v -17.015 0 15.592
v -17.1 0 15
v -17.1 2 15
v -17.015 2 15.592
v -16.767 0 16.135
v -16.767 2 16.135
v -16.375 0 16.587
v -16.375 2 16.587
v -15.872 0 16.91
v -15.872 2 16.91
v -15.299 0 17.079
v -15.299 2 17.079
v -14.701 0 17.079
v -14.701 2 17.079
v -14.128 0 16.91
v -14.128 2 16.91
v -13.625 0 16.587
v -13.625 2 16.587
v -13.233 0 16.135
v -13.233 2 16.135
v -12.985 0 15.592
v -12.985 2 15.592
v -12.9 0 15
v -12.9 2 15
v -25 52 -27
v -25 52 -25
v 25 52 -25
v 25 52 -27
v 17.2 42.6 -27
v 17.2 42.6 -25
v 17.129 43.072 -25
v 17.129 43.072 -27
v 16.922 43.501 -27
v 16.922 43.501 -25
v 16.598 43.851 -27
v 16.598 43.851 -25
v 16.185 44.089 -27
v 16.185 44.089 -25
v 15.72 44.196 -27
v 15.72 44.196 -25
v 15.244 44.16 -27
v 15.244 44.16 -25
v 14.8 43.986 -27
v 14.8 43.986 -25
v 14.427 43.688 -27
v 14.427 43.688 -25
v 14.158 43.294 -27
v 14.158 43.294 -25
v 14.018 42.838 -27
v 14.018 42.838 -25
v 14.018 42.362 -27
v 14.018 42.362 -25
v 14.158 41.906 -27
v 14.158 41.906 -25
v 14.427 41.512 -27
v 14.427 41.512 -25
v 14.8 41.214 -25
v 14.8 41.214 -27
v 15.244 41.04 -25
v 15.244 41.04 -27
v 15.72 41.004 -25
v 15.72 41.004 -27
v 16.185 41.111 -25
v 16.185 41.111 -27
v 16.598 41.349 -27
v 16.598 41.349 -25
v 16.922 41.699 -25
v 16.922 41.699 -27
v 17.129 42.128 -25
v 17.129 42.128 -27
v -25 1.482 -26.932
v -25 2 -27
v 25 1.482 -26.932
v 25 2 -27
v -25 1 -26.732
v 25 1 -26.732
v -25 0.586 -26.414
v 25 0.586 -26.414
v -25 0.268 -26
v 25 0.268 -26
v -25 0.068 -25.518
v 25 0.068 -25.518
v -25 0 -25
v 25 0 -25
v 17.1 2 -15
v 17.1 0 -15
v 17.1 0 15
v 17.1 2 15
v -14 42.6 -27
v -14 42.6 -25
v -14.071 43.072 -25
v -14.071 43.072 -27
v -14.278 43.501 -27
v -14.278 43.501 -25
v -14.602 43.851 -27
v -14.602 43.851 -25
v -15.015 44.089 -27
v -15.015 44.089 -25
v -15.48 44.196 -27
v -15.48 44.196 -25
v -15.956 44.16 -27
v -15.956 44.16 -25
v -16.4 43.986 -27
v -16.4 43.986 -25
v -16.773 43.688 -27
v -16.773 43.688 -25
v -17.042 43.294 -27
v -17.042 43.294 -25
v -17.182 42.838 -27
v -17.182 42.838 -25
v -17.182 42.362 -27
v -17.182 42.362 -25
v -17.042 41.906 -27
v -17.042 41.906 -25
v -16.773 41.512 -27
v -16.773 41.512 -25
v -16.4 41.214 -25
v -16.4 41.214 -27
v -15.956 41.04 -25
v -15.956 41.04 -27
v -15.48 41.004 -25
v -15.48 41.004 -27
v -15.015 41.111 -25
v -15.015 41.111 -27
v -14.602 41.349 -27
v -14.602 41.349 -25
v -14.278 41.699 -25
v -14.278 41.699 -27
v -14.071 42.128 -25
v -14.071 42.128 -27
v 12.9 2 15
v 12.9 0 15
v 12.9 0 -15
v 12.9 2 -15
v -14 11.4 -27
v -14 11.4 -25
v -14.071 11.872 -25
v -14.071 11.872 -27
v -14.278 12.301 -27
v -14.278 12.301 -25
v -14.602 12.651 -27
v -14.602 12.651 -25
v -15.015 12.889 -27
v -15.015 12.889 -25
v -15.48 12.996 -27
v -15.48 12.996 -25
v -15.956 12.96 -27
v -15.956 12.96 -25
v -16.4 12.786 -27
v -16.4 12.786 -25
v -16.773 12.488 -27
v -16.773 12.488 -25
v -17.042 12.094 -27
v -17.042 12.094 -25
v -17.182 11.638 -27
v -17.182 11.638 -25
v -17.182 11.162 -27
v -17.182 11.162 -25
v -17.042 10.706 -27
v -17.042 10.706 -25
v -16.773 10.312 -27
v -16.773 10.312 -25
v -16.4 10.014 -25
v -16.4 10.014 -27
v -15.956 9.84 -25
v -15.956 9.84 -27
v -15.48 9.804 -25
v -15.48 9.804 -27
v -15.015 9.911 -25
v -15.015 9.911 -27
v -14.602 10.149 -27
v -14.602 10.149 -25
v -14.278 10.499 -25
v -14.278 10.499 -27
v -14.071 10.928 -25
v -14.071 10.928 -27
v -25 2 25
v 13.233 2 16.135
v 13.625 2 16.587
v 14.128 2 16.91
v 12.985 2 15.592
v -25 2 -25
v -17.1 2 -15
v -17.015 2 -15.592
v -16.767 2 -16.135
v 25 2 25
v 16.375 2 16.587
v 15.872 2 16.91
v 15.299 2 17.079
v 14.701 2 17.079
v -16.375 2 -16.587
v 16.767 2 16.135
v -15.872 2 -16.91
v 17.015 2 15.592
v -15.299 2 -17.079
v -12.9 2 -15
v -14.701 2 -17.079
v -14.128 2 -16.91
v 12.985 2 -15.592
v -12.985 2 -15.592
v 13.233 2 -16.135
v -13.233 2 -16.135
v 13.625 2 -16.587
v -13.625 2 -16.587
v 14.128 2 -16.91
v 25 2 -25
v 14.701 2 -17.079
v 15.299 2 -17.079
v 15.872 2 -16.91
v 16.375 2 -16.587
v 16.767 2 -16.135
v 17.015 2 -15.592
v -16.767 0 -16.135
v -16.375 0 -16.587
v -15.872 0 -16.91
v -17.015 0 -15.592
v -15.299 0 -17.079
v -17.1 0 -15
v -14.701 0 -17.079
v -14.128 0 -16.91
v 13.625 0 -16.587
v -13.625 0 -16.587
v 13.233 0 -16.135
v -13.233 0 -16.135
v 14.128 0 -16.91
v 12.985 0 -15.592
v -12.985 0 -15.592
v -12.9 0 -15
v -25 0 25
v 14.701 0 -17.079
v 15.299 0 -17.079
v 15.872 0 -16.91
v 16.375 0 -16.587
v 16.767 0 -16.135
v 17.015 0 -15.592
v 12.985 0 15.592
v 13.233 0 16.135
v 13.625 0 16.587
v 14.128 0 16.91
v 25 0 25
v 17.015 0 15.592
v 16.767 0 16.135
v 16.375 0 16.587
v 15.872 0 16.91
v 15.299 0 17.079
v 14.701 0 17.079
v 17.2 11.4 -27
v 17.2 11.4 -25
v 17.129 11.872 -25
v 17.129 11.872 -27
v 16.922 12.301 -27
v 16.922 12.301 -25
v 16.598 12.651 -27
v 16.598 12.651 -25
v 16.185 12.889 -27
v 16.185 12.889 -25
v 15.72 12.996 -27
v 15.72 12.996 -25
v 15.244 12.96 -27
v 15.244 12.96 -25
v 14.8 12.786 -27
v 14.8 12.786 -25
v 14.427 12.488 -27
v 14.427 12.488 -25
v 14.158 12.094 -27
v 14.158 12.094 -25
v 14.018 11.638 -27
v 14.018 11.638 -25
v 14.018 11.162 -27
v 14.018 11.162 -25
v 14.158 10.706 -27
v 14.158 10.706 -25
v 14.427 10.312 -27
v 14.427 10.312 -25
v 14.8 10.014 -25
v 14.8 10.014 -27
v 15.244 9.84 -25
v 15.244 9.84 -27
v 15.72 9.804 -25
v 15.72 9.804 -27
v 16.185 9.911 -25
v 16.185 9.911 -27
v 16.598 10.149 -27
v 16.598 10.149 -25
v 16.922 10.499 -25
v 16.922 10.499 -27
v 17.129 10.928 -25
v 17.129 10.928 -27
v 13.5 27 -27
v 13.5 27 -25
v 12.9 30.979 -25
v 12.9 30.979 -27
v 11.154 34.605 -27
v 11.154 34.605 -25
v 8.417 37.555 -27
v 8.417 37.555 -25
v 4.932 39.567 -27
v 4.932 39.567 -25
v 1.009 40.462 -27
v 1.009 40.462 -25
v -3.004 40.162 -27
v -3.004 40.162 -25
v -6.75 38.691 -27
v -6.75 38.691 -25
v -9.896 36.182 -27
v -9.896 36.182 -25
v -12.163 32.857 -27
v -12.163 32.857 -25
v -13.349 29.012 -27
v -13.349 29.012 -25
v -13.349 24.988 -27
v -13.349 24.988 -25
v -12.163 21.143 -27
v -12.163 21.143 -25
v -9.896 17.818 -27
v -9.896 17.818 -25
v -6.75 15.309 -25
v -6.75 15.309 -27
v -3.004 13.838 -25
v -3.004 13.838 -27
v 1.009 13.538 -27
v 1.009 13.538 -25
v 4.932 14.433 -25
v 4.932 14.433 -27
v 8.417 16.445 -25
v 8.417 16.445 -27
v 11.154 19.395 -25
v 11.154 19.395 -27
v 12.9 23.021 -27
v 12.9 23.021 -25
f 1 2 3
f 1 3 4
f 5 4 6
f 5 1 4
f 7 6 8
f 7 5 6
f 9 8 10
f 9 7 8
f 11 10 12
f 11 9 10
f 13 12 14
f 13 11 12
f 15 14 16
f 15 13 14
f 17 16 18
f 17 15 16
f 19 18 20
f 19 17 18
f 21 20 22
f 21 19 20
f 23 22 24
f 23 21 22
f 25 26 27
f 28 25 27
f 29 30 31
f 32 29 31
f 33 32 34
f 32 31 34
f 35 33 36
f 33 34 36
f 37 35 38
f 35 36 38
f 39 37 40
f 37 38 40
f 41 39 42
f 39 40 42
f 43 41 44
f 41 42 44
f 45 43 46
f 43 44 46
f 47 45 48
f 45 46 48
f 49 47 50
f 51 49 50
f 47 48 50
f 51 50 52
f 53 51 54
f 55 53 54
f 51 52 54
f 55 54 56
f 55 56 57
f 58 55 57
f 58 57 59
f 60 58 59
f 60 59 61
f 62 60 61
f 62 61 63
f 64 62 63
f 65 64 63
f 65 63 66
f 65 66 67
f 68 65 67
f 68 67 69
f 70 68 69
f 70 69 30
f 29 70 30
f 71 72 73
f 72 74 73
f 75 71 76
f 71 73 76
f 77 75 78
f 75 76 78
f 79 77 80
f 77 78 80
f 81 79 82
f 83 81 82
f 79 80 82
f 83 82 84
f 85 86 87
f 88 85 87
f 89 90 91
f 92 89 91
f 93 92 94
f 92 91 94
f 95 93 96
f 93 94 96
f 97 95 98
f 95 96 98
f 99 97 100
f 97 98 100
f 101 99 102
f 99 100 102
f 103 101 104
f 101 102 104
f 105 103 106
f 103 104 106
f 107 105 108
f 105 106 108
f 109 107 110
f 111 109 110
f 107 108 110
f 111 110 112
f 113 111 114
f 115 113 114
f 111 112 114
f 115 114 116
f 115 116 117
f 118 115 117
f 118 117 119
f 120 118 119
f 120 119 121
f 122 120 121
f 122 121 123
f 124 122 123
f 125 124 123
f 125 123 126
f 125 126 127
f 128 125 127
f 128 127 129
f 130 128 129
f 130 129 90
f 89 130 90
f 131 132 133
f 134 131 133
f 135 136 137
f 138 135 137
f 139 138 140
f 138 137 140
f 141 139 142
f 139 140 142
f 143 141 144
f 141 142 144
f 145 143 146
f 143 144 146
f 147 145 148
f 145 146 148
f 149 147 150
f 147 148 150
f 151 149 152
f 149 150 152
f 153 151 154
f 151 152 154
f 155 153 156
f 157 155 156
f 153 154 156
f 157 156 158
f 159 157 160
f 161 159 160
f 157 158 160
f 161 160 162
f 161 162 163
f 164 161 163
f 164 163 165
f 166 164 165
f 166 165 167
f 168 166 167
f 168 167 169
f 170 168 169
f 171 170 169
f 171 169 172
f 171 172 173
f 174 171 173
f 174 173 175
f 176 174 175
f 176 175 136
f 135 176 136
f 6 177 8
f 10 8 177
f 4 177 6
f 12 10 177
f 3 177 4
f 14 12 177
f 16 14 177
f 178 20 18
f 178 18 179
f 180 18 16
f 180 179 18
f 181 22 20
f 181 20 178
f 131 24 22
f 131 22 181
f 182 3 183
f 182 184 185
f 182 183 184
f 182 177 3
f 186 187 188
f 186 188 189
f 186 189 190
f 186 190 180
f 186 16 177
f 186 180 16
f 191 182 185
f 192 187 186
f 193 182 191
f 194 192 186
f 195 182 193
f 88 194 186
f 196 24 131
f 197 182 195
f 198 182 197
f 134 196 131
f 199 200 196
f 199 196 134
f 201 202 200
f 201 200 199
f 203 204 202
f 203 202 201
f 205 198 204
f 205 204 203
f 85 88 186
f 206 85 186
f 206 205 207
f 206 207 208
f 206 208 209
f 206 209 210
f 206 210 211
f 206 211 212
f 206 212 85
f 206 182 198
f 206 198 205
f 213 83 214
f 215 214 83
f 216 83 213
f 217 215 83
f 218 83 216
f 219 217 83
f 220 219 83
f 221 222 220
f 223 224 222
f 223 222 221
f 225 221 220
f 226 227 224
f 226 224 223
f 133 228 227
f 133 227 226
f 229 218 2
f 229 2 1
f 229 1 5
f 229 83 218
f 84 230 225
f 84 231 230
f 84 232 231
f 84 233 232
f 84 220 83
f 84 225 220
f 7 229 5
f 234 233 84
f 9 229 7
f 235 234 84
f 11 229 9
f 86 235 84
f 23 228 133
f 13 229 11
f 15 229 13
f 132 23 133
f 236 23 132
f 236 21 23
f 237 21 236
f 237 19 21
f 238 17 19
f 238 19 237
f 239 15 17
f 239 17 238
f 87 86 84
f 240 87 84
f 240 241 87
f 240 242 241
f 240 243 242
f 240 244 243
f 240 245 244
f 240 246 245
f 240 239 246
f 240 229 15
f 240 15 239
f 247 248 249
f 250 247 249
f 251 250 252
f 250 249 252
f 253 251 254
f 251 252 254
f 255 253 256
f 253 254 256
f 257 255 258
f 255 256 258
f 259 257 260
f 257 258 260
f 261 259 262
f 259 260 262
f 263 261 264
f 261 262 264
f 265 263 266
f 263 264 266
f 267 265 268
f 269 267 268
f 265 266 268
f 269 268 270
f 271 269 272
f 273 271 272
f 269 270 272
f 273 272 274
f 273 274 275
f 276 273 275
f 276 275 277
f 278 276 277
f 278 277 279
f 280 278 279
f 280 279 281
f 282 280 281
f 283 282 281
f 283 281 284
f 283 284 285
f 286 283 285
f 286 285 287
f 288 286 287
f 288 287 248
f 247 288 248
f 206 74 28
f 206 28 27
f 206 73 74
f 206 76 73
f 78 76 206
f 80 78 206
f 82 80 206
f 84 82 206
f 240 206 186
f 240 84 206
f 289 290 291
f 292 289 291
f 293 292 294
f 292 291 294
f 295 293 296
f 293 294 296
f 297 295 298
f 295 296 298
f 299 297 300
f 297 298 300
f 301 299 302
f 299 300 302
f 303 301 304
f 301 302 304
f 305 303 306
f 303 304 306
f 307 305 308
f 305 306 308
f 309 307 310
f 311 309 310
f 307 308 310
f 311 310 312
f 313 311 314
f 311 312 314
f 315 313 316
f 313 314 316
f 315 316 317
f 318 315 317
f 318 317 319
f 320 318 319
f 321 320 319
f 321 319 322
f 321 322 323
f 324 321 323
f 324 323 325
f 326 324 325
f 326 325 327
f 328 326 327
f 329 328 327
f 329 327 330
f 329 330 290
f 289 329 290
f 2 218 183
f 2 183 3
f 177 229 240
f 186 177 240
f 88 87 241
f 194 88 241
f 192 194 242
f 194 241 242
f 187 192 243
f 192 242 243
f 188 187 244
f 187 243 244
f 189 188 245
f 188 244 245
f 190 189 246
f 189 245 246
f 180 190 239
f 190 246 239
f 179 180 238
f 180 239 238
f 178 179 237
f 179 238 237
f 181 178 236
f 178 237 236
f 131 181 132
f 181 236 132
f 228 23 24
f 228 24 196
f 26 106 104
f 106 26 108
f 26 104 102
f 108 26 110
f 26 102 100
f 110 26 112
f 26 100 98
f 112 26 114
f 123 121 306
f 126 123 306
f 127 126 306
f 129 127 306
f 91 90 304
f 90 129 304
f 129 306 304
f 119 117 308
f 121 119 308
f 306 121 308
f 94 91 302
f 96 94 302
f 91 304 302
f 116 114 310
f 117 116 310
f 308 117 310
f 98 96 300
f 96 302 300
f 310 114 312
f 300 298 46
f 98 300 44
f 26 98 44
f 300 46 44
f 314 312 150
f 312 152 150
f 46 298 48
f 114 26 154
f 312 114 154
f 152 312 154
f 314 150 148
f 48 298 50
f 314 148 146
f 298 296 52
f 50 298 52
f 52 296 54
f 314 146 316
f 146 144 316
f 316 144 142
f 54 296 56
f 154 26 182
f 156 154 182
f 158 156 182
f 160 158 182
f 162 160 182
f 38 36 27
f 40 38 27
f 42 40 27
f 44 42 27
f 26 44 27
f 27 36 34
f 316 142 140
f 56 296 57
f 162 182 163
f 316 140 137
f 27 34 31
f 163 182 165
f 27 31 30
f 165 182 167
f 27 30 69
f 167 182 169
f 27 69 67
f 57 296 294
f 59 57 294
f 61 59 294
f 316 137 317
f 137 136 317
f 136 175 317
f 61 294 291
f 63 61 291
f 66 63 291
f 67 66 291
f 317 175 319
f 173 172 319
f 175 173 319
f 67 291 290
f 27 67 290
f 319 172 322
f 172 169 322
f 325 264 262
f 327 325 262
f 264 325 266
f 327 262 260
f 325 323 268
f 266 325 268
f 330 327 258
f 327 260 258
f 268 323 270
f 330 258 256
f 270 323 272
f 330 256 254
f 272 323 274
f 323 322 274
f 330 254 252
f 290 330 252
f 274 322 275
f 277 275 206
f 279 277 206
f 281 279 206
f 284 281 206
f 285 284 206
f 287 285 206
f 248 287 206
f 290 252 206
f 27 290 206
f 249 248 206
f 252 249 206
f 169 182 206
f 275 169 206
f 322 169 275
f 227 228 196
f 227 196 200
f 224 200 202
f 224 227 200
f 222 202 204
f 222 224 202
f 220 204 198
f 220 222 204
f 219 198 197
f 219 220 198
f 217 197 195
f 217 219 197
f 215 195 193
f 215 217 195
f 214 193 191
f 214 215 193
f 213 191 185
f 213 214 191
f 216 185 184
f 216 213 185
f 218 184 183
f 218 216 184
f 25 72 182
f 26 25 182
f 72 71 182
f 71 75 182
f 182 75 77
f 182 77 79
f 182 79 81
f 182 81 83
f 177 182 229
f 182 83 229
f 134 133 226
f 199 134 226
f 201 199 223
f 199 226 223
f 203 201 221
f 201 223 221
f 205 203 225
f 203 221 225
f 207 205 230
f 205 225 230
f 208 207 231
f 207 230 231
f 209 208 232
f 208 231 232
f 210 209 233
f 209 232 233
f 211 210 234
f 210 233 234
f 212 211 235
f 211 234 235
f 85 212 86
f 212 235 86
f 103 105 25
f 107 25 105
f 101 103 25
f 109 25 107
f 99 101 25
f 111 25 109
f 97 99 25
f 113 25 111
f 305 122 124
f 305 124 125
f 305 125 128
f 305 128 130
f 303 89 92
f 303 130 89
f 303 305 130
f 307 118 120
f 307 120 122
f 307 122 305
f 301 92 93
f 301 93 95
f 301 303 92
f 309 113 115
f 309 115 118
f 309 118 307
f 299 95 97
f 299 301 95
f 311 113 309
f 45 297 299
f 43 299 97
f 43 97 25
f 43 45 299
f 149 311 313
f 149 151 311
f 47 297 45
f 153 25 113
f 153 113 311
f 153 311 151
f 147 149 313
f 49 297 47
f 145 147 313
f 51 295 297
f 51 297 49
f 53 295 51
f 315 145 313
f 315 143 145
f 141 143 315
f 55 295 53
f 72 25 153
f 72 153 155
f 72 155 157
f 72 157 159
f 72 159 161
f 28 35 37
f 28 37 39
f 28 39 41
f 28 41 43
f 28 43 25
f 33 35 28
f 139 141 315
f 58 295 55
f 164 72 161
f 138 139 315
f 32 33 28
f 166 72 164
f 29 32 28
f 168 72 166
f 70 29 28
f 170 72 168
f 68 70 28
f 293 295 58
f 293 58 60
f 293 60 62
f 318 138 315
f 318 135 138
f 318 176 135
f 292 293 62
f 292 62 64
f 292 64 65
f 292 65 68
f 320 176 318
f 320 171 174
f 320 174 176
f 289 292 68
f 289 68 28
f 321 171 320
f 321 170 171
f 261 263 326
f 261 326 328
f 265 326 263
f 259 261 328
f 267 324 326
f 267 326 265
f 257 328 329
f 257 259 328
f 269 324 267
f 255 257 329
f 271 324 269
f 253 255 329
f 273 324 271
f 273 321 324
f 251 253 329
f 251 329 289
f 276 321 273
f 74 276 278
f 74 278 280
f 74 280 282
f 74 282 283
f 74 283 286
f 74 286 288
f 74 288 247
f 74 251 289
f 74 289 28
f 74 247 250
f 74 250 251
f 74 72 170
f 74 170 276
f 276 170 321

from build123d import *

# Parameters (mm, degrees)
SKETCH1_W           = 50
SKETCH1_H           = 50
BOSS_EXTRUDE1_DEPTH = 2
SKETCH2_W           = 50
SKETCH2_H           = 2
BOSS_EXTRUDE2_DEPTH = 52
CUT_EXTRUDE1_REACH  = 4
SKETCH3_R           = 1.6
SKETCH3_R_2         = 13.5
FILLET1_R           = 2


with BuildPart() as part:
    # Sketch1 → Boss-Extrude1 (new body)
    with BuildSketch(Plane(origin=(0, 0, 0), x_dir=(1, 0, 0), z_dir=(0, 1, 0))):
        Rectangle(SKETCH1_W, SKETCH1_H)
        with BuildLine():
            Line((-17.1, 15), (-17.1, -15))
            ThreePointArc((-17.1, -15), (-15, -17.1), (-12.9, -15))
            Line((-12.9, -15), (-12.9, 15))
            ThreePointArc((-12.9, 15), (-15, 17.1), (-17.1, 15))
        make_face(mode=Mode.SUBTRACT)
        with BuildLine():
            Line((17.1, 15), (17.1, -15))
            ThreePointArc((17.1, -15), (15, -17.1), (12.9, -15))
            Line((12.9, -15), (12.9, 15))
            ThreePointArc((12.9, 15), (15, 17.1), (17.1, 15))
        make_face(mode=Mode.SUBTRACT)
    extrude(amount=BOSS_EXTRUDE1_DEPTH)

    # Sketch2 → Boss-Extrude2 (add)
    with BuildSketch(Plane.XZ):
        with Locations((0, -26)):
            Rectangle(SKETCH2_W, SKETCH2_H)
    extrude(amount=-BOSS_EXTRUDE2_DEPTH)

    # Sketch3 → Cut-Extrude1 (cut, up to next)
    with BuildSketch(Plane.XY.offset(-25), mode=Mode.PRIVATE) as cut_extrude1_sk1:
        with Locations((-15.6, 42.6)):
            Circle(SKETCH3_R)
    cut_extrude1_tool1 = extrude(cut_extrude1_sk1.sketch, amount=-CUT_EXTRUDE1_REACH, mode=Mode.PRIVATE) & part.part
    add(cut_extrude1_tool1.solids().sort_by_distance((-15.6, 42.6, -25))[0], mode=Mode.SUBTRACT)
    # Sketch3 → Cut-Extrude1 (cut, up to next)
    with BuildSketch(Plane.XY.offset(-25), mode=Mode.PRIVATE) as cut_extrude1_sk2:
        with Locations((15.6, 42.6)):
            Circle(SKETCH3_R)
    cut_extrude1_tool2 = extrude(cut_extrude1_sk2.sketch, amount=-CUT_EXTRUDE1_REACH, mode=Mode.PRIVATE) & part.part
    add(cut_extrude1_tool2.solids().sort_by_distance((15.6, 42.6, -25))[0], mode=Mode.SUBTRACT)
    # Sketch3 → Cut-Extrude1 (cut, up to next)
    with BuildSketch(Plane.XY.offset(-25), mode=Mode.PRIVATE) as cut_extrude1_sk3:
        with Locations((15.6, 11.4)):
            Circle(SKETCH3_R)
    cut_extrude1_tool3 = extrude(cut_extrude1_sk3.sketch, amount=-CUT_EXTRUDE1_REACH, mode=Mode.PRIVATE) & part.part
    add(cut_extrude1_tool3.solids().sort_by_distance((15.6, 11.4, -25))[0], mode=Mode.SUBTRACT)
    # Sketch3 → Cut-Extrude1 (cut, up to next)
    with BuildSketch(Plane.XY.offset(-25), mode=Mode.PRIVATE) as cut_extrude1_sk4:
        with Locations((-15.6, 11.4)):
            Circle(SKETCH3_R)
    cut_extrude1_tool4 = extrude(cut_extrude1_sk4.sketch, amount=-CUT_EXTRUDE1_REACH, mode=Mode.PRIVATE) & part.part
    add(cut_extrude1_tool4.solids().sort_by_distance((-15.6, 11.4, -25))[0], mode=Mode.SUBTRACT)
    # Sketch3 → Cut-Extrude1 (cut, up to next)
    with BuildSketch(Plane.XY.offset(-25), mode=Mode.PRIVATE) as cut_extrude1_sk5:
        with Locations((0, 27)):
            Circle(SKETCH3_R_2)
    cut_extrude1_tool5 = extrude(cut_extrude1_sk5.sketch, amount=-CUT_EXTRUDE1_REACH, mode=Mode.PRIVATE) & part.part
    add(cut_extrude1_tool5.solids().sort_by_distance((0, 27, -25))[0], mode=Mode.SUBTRACT)

    # Fillet1
    fillet1_edges = [part.edges().sort_by_distance(p)[0] for p in [
        (0, 0, -27),
    ]]
    fillet(fillet1_edges, radius=FILLET1_R)


solid = part.part
